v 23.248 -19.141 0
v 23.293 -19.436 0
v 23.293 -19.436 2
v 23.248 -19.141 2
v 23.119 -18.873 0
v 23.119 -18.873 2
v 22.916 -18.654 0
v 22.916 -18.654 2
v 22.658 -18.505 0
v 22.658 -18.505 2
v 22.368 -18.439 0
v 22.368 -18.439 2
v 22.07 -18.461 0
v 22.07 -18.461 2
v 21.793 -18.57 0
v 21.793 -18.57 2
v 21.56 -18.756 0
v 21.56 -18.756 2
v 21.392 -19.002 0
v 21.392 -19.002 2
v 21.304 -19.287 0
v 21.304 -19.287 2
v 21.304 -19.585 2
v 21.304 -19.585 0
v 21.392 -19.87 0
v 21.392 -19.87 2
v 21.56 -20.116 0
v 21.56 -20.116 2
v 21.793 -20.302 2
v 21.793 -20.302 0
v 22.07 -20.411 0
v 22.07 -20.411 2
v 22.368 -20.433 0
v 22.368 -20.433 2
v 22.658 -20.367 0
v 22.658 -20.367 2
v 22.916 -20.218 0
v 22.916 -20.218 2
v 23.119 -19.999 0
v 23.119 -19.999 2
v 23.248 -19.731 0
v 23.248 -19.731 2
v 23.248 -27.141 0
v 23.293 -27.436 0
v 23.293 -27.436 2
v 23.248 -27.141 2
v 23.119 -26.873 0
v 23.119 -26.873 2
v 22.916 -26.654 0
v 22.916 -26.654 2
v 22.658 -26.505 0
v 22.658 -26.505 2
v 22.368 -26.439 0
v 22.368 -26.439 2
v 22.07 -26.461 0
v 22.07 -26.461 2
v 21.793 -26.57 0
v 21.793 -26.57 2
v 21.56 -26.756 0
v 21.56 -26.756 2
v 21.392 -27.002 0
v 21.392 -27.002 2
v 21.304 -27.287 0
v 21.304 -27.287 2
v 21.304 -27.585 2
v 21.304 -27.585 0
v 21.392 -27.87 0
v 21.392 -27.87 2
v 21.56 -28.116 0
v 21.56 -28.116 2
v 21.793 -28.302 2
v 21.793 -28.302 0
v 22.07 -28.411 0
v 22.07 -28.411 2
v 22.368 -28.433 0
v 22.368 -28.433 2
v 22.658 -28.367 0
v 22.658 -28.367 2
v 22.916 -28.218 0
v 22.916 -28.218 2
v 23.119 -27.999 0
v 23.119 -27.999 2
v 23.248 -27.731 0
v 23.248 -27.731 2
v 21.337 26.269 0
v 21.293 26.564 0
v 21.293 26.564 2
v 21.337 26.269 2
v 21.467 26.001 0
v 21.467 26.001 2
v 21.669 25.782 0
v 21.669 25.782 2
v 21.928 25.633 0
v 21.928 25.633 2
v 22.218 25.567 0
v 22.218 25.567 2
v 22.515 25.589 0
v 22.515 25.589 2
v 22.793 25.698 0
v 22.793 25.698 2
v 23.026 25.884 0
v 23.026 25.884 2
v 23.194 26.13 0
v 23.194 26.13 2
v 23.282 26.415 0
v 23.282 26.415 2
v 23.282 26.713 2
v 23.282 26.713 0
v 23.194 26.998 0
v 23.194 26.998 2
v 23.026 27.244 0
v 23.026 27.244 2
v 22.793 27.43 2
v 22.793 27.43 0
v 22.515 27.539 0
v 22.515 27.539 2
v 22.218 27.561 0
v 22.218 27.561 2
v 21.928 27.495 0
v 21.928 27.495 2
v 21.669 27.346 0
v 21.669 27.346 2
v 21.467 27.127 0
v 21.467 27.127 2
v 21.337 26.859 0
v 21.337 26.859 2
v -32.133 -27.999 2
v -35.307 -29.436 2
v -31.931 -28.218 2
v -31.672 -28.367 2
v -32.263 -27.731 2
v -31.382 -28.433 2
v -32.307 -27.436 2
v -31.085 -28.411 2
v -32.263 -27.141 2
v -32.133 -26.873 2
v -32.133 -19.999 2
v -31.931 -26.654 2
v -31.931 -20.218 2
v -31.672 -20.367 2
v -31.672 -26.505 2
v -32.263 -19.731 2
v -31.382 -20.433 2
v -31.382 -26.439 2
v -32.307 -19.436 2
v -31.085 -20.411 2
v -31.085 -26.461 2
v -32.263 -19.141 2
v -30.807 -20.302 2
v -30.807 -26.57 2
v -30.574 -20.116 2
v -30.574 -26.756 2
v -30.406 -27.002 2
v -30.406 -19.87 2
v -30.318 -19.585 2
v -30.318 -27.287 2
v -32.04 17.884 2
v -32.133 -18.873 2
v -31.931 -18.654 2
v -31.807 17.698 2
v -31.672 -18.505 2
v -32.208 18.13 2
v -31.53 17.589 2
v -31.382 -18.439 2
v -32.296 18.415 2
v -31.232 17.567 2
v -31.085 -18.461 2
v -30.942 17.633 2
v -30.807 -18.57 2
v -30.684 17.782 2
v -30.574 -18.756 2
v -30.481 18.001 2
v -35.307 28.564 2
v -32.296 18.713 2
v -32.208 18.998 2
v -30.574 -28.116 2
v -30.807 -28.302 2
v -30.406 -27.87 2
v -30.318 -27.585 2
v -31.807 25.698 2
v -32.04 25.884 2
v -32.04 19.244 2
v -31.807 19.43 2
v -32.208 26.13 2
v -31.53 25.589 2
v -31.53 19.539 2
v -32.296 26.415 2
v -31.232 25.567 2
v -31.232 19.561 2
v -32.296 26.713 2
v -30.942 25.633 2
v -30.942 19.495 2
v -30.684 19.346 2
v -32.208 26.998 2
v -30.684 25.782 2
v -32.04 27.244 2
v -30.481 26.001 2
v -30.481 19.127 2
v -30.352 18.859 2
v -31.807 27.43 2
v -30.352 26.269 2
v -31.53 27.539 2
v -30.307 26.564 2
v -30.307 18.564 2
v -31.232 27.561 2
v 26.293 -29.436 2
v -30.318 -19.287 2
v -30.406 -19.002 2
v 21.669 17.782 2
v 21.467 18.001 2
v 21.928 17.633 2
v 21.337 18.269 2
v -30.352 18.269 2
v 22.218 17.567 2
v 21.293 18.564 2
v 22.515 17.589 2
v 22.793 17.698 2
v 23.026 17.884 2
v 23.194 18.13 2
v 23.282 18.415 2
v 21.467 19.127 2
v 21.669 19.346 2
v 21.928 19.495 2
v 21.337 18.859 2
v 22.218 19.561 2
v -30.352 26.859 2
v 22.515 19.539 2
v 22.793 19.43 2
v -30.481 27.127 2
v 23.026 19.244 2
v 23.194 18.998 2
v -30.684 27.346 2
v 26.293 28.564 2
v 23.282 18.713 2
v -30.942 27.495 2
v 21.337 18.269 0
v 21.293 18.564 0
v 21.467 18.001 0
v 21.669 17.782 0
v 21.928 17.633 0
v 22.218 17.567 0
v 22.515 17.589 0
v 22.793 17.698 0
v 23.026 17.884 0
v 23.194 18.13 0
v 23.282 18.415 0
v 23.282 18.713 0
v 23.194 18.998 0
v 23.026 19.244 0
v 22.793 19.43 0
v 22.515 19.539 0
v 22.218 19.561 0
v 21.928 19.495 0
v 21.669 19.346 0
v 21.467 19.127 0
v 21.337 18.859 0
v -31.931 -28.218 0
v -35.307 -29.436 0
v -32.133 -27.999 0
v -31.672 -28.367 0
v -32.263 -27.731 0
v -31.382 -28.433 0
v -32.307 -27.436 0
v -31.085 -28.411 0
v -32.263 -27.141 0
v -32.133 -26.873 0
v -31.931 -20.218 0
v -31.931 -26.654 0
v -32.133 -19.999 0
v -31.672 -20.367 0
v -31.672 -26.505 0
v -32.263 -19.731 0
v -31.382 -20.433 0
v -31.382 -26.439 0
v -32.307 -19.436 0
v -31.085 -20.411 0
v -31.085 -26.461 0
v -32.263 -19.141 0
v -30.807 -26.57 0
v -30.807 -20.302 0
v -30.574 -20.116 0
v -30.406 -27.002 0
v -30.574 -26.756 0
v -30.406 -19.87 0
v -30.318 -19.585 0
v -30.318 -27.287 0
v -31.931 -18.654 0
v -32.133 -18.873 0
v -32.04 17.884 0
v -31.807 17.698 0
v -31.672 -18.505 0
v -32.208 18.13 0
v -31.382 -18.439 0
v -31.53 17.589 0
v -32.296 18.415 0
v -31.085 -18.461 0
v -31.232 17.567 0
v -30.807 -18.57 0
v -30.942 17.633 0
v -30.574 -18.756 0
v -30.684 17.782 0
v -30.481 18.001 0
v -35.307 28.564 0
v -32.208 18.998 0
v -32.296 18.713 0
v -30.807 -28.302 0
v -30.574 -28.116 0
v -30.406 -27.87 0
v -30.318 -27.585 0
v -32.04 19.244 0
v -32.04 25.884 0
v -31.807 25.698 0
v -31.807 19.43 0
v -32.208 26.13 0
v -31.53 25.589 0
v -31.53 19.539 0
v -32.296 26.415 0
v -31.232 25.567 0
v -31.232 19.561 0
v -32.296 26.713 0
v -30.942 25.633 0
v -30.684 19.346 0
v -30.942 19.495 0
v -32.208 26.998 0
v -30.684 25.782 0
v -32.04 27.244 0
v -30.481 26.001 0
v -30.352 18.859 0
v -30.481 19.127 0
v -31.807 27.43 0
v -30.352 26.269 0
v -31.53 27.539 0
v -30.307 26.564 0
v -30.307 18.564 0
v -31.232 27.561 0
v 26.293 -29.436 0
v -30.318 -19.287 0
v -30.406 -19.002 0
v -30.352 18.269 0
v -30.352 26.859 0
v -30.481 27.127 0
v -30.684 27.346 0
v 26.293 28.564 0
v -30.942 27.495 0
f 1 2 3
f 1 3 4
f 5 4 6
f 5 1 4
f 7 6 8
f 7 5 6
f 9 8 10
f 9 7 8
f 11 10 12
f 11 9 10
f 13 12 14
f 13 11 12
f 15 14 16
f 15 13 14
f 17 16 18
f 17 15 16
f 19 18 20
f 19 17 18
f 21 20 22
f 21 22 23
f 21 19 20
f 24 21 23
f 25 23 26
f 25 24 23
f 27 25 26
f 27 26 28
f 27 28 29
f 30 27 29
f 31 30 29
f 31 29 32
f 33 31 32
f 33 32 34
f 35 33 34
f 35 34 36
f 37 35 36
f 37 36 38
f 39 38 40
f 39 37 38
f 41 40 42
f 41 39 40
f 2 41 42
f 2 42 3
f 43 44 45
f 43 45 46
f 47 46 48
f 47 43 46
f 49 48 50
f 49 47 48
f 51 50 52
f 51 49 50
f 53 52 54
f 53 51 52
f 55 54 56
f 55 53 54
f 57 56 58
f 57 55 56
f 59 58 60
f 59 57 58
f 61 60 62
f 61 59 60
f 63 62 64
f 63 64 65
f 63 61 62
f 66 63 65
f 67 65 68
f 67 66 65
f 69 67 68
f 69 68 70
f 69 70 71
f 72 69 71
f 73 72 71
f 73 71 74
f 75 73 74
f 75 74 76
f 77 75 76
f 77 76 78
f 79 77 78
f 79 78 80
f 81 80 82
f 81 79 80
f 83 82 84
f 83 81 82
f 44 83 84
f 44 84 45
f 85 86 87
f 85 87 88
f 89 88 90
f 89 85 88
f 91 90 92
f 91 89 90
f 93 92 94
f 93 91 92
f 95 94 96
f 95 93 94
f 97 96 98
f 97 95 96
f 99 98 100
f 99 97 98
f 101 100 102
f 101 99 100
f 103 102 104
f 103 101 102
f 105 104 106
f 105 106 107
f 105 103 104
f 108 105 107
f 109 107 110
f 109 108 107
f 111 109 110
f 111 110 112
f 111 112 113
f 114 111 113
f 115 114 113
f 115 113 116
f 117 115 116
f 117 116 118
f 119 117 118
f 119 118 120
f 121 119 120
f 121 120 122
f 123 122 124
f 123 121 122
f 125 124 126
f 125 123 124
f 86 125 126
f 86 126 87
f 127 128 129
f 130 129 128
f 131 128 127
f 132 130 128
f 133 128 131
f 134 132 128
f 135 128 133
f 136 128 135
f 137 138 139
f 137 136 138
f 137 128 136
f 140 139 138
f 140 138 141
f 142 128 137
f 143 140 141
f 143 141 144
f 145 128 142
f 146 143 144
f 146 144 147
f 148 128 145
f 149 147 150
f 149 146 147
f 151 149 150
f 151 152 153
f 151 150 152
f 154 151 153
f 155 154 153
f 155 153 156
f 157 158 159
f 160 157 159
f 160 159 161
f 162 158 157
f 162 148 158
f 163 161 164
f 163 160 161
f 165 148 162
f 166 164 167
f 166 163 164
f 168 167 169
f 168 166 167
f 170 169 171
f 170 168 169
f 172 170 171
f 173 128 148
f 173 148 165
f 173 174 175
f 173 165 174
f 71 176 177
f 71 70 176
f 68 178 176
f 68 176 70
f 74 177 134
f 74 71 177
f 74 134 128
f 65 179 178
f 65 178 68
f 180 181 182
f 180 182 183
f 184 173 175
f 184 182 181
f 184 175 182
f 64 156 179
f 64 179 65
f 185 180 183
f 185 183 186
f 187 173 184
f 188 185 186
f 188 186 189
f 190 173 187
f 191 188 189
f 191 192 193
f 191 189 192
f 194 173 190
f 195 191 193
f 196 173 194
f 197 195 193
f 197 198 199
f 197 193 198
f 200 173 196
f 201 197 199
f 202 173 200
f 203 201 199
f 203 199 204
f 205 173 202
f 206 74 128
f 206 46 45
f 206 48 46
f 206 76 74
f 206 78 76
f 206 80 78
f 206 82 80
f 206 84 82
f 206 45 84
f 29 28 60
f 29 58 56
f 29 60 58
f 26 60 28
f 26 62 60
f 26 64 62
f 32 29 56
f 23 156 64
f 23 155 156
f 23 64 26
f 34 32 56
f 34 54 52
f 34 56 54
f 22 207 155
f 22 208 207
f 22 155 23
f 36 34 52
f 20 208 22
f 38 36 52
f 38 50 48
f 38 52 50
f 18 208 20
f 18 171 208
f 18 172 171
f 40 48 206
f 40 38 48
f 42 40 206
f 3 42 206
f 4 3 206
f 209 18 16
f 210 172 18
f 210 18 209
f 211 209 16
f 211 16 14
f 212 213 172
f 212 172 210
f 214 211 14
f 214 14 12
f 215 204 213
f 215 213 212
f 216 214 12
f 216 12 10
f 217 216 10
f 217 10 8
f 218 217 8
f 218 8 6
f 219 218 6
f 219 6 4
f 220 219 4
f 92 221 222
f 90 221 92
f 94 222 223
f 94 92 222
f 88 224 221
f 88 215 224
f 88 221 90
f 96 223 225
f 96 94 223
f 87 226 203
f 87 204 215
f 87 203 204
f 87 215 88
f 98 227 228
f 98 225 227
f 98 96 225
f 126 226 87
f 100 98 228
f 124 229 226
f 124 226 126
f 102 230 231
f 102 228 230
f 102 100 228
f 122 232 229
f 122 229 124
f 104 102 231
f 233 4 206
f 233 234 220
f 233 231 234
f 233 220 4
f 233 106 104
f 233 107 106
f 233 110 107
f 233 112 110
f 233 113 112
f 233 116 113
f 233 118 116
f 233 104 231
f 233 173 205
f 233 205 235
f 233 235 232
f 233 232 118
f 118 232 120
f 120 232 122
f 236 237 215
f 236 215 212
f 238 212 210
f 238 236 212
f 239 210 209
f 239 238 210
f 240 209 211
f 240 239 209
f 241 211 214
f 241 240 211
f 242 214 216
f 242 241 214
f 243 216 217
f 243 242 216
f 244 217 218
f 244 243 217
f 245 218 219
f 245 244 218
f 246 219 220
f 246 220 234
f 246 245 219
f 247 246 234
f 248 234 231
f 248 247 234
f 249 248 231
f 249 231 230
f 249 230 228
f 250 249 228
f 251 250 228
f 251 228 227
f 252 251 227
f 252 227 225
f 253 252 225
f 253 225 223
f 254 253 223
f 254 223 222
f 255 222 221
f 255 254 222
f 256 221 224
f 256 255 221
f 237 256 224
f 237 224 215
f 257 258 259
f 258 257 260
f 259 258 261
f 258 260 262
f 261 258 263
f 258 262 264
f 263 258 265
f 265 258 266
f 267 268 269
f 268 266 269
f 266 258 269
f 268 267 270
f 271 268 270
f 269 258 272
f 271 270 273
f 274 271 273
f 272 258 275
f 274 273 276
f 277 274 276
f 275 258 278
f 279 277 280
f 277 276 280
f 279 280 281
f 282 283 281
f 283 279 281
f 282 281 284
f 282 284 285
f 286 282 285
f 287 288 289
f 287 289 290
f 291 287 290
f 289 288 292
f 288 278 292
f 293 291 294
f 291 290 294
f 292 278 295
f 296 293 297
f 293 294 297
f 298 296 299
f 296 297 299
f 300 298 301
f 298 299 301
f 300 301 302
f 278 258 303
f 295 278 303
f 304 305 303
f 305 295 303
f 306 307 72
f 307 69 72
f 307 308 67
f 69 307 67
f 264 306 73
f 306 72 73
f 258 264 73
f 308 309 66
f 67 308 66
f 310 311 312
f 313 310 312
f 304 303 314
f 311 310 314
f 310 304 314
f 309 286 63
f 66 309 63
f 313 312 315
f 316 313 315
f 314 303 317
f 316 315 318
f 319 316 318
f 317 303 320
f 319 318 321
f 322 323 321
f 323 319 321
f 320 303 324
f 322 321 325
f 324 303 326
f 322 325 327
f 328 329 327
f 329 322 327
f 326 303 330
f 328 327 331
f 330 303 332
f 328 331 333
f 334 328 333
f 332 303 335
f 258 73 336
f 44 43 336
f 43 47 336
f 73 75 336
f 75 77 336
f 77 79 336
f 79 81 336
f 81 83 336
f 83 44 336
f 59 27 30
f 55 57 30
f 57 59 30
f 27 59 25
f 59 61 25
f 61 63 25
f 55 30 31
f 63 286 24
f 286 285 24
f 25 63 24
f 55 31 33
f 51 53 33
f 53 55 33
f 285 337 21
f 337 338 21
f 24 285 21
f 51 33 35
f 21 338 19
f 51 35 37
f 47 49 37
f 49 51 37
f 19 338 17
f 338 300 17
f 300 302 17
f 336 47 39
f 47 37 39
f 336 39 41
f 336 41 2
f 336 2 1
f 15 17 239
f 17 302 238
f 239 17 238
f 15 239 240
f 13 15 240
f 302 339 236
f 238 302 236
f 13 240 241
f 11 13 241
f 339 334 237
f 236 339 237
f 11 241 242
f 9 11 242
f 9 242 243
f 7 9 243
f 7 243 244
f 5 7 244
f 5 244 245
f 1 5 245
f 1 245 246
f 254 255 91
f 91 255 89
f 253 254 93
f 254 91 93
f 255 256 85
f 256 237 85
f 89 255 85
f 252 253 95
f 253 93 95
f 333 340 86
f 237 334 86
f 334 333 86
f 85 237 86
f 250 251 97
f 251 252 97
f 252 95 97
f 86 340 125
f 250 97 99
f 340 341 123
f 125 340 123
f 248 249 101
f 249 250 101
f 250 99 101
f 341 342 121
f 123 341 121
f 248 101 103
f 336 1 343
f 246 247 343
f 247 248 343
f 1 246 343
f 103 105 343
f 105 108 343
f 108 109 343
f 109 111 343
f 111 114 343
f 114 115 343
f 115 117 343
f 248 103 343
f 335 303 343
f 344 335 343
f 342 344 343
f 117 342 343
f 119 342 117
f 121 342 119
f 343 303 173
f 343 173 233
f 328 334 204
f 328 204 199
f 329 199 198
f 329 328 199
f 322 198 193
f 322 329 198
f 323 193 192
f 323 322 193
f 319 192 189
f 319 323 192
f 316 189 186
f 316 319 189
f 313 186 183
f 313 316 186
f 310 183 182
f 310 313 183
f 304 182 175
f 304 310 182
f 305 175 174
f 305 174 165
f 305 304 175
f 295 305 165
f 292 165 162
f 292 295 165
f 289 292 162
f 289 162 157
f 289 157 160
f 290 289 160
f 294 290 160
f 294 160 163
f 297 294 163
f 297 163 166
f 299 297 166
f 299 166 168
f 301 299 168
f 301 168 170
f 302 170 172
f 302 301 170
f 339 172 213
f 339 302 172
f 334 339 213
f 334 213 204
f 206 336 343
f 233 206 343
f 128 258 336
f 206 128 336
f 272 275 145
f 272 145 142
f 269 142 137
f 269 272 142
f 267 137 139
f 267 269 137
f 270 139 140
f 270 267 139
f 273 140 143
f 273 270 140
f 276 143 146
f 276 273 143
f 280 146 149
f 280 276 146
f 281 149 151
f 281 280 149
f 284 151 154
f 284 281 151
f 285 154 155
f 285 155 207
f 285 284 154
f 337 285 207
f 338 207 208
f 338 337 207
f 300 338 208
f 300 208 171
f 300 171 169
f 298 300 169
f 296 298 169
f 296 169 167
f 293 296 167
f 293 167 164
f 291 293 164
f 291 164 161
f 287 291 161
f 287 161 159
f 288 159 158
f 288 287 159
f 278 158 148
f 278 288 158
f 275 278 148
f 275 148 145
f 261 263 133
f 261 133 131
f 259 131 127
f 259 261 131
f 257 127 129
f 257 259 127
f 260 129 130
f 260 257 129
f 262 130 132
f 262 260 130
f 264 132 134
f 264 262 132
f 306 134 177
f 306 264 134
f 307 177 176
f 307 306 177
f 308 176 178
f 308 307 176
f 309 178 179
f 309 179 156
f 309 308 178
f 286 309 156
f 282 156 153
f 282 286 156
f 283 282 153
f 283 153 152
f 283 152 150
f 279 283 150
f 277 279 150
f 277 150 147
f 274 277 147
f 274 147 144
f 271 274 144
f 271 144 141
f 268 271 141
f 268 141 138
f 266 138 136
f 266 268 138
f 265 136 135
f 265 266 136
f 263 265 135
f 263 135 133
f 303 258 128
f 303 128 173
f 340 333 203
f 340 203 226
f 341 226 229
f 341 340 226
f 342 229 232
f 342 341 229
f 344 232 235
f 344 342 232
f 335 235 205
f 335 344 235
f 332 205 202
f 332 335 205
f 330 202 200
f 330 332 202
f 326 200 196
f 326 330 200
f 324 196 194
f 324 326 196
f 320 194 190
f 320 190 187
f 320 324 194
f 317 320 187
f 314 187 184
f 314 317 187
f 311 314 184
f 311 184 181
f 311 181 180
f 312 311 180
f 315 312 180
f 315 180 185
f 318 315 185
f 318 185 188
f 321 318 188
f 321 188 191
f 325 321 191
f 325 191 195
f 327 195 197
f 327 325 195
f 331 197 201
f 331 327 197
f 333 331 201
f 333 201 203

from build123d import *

# Parameters (mm, degrees)
SKETCH_1_W      = 61.6
SKETCH_1_H      = 58
SKETCH_1_R      = 1
EXTRUDE_1_DEPTH = 2


with BuildPart() as part:
    # 草圖1 → 填料-伸長1 (new body)
    with BuildSketch(Plane.XY):
        with Locations((-4.507156781, -0.436090226)):
            Rectangle(SKETCH_1_W, SKETCH_1_H)
        with Locations((-31.307156781, 26.563909774)):
            Circle(SKETCH_1_R, mode=Mode.SUBTRACT)
        with Locations((-31.307156781, 18.563909774)):
            Circle(SKETCH_1_R, mode=Mode.SUBTRACT)
        with Locations(Location((22.292843219, 18.563909774, 0), (0, 0, 180))):
            Circle(SKETCH_1_R, mode=Mode.SUBTRACT)
        with Locations(Location((22.292843219, 26.563909774, 0), (0, 0, 180))):
            Circle(SKETCH_1_R, mode=Mode.SUBTRACT)
        with Locations((22.292843219, -27.436090226)):
            Circle(SKETCH_1_R, mode=Mode.SUBTRACT)
        with Locations((22.292843219, -19.436090226)):
            Circle(SKETCH_1_R, mode=Mode.SUBTRACT)
        with Locations(Location((-31.307156781, -19.436090226, 0), (0, 0, 180))):
            Circle(SKETCH_1_R, mode=Mode.SUBTRACT)
        with Locations(Location((-31.307156781, -27.436090226, 0), (0, 0, 180))):
            Circle(SKETCH_1_R, mode=Mode.SUBTRACT)
    extrude(amount=EXTRUDE_1_DEPTH)


solid = part.part
